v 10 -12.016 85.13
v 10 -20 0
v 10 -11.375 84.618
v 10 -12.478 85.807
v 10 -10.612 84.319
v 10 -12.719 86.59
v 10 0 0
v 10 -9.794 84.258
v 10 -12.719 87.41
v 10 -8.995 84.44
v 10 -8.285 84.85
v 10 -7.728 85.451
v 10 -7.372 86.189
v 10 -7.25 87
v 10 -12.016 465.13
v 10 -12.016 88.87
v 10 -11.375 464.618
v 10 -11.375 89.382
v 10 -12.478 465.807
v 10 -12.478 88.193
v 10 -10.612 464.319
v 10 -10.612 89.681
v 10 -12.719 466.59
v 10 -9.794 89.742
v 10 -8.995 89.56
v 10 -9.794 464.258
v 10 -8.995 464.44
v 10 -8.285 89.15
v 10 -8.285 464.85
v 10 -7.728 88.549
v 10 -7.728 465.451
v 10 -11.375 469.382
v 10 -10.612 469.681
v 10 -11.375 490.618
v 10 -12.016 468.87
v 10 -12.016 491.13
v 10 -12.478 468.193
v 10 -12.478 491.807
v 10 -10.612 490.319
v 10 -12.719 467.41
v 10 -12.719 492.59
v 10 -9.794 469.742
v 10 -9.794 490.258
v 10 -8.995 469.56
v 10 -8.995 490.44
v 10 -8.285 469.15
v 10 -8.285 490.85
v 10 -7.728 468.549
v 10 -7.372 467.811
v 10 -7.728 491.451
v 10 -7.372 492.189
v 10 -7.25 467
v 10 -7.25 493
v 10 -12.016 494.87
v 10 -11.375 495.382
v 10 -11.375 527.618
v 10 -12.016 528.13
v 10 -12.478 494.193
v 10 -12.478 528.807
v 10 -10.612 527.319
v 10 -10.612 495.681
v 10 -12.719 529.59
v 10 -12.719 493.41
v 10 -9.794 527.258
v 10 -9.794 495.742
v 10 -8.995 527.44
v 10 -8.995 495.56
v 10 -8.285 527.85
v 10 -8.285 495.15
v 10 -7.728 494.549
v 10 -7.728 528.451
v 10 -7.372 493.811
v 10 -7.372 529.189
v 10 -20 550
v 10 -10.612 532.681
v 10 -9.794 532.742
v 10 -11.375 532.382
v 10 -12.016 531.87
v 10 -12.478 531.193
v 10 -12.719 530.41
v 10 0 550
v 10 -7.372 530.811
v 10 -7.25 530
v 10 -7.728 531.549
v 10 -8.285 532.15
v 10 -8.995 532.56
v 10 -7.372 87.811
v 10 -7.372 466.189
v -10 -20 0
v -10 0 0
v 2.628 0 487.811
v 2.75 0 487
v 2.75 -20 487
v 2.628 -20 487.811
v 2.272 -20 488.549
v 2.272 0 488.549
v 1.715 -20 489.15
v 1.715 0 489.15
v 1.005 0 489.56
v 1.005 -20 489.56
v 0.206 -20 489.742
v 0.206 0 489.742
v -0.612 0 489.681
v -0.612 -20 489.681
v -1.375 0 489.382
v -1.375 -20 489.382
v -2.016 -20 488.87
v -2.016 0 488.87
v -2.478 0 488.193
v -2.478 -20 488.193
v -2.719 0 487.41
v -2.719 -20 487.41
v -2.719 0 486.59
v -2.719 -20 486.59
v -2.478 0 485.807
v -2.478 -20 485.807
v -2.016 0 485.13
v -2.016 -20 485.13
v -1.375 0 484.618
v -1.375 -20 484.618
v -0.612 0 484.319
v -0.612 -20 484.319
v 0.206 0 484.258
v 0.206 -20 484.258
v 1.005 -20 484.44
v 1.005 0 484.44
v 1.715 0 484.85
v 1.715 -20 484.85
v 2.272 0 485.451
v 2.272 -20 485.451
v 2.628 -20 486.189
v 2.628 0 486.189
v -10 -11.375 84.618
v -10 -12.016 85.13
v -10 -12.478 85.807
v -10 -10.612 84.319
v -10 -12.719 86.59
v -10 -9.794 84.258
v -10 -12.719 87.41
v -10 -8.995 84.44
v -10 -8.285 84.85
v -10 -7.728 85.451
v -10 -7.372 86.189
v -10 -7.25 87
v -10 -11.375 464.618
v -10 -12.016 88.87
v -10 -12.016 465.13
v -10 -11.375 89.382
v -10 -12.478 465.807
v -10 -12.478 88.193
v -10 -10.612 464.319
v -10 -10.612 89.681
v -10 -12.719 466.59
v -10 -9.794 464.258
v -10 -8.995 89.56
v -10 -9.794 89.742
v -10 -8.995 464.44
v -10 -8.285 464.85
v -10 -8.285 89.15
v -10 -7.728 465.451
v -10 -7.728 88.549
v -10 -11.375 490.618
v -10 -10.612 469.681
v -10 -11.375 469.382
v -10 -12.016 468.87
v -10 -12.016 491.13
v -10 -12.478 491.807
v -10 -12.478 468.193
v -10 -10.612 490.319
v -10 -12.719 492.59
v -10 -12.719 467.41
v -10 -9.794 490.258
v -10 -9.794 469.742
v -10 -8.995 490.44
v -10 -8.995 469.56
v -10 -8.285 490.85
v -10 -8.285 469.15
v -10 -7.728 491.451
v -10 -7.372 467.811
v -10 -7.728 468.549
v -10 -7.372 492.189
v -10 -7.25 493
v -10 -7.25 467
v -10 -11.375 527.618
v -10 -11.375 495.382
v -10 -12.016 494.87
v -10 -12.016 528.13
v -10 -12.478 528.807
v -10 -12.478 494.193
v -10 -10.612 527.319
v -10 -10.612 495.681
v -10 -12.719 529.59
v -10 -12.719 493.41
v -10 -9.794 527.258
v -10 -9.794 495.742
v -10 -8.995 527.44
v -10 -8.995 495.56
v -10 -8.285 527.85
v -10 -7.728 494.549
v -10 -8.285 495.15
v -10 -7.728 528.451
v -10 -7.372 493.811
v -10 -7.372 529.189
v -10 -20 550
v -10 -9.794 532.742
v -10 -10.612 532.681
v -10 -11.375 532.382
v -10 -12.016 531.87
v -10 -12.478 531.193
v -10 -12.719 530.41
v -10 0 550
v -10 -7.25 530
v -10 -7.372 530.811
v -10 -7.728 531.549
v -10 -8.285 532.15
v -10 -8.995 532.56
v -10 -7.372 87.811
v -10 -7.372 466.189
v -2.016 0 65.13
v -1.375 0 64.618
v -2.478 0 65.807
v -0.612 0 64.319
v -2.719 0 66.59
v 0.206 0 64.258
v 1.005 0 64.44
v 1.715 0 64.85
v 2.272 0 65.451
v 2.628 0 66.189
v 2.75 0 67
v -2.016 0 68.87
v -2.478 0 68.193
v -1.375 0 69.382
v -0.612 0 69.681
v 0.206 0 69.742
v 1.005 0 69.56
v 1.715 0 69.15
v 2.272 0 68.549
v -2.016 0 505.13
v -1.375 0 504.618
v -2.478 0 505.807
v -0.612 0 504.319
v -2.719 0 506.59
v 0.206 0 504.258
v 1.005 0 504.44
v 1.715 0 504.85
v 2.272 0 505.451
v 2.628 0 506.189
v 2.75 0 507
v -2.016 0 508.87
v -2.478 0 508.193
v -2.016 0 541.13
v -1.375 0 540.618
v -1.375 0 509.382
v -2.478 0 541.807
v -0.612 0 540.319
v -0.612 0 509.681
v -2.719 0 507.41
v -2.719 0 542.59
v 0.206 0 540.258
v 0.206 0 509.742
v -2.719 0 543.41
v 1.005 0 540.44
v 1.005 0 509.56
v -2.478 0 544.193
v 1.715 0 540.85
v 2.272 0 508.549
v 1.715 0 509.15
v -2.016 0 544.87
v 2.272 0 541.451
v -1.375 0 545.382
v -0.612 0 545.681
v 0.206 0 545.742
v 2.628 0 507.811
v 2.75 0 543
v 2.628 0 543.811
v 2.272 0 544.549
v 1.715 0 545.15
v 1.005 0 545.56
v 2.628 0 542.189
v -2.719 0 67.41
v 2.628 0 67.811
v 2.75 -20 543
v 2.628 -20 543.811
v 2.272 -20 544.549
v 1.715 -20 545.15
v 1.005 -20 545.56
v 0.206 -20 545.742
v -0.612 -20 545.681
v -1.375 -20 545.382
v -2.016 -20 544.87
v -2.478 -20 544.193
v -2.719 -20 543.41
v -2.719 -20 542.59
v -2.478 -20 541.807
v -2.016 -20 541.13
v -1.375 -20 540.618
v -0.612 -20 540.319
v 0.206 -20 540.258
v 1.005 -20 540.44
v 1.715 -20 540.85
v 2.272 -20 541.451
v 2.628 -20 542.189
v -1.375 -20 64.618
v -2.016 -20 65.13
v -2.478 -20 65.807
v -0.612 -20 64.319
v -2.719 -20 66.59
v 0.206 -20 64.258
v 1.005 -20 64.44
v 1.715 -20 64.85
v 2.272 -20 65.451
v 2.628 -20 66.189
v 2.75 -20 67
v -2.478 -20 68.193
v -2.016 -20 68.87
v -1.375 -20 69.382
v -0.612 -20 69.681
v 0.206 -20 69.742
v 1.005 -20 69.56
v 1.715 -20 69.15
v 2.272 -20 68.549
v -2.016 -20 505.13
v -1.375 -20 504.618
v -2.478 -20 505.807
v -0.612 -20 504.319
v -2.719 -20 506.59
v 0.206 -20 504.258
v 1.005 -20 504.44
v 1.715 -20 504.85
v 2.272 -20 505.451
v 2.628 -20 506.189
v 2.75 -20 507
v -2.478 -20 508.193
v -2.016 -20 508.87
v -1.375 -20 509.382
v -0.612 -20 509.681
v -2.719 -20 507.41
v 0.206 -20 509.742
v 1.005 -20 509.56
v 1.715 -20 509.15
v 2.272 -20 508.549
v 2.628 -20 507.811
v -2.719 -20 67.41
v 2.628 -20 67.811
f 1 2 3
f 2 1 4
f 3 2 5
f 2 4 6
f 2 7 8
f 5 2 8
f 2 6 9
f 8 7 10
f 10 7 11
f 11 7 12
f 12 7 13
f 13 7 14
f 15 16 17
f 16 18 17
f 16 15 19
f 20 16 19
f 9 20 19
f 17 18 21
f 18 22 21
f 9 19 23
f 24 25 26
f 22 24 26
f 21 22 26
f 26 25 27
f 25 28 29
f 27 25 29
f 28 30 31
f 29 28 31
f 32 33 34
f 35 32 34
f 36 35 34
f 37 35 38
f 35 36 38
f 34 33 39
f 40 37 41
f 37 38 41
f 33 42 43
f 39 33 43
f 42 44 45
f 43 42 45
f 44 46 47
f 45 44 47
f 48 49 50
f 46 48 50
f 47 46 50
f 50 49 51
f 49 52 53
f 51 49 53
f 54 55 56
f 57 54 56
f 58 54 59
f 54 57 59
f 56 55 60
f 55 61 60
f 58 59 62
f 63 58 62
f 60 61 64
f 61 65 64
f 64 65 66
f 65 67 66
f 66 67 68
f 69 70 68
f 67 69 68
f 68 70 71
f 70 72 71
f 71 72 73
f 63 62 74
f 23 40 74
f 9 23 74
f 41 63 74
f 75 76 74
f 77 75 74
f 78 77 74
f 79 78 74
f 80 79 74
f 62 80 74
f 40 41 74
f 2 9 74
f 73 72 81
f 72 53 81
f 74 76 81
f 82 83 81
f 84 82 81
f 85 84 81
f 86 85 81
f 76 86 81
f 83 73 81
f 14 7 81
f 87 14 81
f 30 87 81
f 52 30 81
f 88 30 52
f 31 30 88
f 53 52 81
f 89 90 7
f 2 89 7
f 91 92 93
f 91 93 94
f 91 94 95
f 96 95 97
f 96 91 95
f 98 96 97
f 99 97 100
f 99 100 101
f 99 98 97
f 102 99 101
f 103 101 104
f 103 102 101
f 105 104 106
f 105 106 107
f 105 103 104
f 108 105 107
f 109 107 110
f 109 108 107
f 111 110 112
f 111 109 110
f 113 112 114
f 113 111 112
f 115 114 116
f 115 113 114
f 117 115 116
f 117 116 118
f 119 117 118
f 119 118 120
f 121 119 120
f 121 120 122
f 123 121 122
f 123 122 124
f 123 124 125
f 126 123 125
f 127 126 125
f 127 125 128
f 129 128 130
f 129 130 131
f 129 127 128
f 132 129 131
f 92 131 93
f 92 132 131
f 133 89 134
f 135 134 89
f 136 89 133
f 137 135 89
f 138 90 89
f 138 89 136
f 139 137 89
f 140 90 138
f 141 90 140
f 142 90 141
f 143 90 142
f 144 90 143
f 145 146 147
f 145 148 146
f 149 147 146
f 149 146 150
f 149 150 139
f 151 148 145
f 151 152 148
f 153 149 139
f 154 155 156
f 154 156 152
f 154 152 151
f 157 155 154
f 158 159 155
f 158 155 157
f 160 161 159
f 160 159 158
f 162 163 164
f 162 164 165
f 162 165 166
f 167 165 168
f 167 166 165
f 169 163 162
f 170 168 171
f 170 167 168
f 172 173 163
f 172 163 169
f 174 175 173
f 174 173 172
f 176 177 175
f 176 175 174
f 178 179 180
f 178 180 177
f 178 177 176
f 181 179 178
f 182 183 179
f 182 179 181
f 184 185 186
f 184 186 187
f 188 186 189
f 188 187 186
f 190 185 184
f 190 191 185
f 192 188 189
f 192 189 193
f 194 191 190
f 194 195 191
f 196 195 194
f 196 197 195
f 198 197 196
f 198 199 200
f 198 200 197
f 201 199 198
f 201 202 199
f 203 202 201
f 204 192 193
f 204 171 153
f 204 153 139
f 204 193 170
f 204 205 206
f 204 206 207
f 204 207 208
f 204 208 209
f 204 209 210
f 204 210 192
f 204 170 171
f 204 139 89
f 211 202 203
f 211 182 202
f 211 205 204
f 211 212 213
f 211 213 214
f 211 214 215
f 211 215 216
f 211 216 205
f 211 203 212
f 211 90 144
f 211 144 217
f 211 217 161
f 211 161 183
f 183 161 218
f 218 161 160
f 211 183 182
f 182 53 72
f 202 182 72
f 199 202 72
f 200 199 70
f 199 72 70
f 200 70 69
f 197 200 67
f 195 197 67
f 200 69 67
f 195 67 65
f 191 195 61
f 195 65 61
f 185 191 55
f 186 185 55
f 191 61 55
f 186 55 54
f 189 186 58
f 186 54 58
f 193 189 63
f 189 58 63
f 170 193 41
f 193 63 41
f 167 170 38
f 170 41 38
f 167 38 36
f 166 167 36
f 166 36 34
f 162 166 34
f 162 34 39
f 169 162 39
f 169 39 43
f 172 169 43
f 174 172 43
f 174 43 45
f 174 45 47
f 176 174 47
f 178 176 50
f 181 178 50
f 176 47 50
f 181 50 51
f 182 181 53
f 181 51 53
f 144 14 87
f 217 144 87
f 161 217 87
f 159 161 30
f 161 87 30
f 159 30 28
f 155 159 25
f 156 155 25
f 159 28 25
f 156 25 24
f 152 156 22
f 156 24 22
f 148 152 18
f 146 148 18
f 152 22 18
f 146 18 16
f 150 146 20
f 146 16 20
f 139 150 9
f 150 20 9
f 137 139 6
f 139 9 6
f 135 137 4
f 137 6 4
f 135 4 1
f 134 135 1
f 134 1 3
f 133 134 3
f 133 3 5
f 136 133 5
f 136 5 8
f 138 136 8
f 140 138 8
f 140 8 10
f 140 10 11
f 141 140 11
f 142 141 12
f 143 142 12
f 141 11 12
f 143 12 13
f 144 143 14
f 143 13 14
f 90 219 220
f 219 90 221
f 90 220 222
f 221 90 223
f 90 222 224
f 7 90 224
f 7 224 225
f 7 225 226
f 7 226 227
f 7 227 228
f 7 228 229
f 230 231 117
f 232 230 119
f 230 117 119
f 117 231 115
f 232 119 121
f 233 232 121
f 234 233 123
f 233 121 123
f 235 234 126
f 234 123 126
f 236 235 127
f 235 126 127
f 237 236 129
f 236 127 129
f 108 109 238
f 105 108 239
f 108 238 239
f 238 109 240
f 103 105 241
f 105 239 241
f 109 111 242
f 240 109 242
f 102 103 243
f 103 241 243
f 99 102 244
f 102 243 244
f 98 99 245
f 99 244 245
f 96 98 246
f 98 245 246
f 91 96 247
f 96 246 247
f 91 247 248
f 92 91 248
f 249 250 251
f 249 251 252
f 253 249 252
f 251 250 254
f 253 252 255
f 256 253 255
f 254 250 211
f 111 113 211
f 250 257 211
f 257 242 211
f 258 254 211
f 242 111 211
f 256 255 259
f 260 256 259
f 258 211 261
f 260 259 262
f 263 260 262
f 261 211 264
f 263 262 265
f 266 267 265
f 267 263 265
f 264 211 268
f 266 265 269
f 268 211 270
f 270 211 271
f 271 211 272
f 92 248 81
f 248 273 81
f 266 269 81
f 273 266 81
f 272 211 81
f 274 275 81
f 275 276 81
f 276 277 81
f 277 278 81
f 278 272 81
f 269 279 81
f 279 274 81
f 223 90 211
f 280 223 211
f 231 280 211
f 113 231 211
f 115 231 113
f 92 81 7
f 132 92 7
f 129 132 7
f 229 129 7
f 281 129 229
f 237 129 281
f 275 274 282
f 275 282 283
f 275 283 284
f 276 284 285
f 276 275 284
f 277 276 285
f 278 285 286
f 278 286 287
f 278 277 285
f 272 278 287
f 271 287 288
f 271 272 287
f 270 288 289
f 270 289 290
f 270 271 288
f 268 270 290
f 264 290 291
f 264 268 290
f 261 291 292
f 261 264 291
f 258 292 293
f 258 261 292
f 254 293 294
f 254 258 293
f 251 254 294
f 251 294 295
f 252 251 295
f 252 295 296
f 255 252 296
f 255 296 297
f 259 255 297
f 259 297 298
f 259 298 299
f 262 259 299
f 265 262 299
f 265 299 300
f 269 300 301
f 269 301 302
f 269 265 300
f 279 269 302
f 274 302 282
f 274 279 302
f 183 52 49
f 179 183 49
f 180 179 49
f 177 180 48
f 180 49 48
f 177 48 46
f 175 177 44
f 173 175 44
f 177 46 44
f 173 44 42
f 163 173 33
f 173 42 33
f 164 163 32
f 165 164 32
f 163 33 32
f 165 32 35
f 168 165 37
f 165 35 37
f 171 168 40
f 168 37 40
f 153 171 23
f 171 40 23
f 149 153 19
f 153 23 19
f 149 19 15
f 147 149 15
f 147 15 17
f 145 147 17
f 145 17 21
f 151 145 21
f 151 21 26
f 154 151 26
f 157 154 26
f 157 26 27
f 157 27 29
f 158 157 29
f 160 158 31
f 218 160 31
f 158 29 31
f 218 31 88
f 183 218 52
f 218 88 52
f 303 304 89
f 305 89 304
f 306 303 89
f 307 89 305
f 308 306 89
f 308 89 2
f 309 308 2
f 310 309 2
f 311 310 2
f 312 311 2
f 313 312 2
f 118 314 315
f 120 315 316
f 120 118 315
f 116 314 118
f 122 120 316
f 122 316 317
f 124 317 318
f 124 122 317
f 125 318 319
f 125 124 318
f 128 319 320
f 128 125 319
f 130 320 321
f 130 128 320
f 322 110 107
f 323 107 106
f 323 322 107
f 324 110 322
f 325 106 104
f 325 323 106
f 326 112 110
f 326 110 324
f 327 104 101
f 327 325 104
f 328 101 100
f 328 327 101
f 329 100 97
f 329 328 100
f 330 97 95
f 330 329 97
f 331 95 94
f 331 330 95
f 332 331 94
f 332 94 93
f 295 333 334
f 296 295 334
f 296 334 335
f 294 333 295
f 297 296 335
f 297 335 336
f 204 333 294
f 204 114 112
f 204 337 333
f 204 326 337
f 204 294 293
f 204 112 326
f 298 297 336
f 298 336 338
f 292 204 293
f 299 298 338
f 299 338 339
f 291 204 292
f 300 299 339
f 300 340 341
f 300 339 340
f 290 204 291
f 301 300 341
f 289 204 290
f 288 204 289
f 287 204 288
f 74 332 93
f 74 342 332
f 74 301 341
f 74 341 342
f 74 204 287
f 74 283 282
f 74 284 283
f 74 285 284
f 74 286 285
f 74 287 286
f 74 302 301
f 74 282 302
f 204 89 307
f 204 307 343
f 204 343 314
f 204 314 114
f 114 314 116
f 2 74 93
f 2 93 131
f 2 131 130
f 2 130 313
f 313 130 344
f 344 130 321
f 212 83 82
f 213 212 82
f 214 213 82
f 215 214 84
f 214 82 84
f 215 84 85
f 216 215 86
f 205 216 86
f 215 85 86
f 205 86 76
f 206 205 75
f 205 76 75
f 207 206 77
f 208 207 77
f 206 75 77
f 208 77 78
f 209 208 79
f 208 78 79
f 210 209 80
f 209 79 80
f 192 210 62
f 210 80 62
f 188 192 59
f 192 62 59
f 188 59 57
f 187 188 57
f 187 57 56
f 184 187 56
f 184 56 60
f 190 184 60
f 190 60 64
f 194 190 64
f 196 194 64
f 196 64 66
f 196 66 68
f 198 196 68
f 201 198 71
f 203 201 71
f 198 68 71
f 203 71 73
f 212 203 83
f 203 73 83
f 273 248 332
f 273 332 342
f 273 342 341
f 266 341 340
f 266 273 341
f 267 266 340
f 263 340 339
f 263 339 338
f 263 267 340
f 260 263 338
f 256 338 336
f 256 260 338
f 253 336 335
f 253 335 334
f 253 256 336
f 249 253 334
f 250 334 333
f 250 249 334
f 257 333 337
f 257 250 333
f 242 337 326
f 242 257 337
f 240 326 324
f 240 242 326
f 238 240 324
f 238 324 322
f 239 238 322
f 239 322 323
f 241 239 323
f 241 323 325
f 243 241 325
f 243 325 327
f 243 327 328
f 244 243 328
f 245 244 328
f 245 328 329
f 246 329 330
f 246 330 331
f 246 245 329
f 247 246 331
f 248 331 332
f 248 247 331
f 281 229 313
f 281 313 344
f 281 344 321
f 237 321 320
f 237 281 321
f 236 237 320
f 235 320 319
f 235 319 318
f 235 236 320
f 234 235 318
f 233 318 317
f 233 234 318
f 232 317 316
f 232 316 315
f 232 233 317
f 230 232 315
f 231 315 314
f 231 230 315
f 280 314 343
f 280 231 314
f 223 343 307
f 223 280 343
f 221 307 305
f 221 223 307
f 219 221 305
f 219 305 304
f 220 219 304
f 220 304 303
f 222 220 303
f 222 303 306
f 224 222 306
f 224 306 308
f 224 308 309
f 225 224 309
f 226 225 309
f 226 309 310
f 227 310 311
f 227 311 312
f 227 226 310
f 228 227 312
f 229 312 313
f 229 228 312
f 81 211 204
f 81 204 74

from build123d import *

# Parameters (mm, degrees)
F0_W     = 20
F0_H     = 550
F0_R     = 2.75
F1_DEPTH = 20
F2_R     = 2.75
F3_DEPTH = 20


with BuildPart() as f1:
    # F0 (on Front) → F1 (new body)
    with BuildSketch(Plane.XZ):
        with Locations((0, 275)):
            Rectangle(F0_W, F0_H)
        with Locations((0, 67)):
            Circle(F0_R, mode=Mode.SUBTRACT)
        with Locations((0, 487)):
            Circle(F0_R, mode=Mode.SUBTRACT)
        with Locations((0, 507)):
            Circle(F0_R, mode=Mode.SUBTRACT)
        with Locations((0, 543)):
            Circle(F0_R, mode=Mode.SUBTRACT)
    extrude(amount=F1_DEPTH)

    # F2 (on face) → F3 (cut)
    with BuildSketch(Plane.YZ.offset(10)):
        with Locations((-10, 530)):
            Circle(F2_R)
        with Locations((-10, 493)):
            Circle(F2_R)
        with Locations((-10, 467)):
            Circle(F2_R)
        with Locations((-10, 87)):
            Circle(F2_R)
    extrude(amount=-F3_DEPTH, mode=Mode.SUBTRACT)


solid = f1.part
